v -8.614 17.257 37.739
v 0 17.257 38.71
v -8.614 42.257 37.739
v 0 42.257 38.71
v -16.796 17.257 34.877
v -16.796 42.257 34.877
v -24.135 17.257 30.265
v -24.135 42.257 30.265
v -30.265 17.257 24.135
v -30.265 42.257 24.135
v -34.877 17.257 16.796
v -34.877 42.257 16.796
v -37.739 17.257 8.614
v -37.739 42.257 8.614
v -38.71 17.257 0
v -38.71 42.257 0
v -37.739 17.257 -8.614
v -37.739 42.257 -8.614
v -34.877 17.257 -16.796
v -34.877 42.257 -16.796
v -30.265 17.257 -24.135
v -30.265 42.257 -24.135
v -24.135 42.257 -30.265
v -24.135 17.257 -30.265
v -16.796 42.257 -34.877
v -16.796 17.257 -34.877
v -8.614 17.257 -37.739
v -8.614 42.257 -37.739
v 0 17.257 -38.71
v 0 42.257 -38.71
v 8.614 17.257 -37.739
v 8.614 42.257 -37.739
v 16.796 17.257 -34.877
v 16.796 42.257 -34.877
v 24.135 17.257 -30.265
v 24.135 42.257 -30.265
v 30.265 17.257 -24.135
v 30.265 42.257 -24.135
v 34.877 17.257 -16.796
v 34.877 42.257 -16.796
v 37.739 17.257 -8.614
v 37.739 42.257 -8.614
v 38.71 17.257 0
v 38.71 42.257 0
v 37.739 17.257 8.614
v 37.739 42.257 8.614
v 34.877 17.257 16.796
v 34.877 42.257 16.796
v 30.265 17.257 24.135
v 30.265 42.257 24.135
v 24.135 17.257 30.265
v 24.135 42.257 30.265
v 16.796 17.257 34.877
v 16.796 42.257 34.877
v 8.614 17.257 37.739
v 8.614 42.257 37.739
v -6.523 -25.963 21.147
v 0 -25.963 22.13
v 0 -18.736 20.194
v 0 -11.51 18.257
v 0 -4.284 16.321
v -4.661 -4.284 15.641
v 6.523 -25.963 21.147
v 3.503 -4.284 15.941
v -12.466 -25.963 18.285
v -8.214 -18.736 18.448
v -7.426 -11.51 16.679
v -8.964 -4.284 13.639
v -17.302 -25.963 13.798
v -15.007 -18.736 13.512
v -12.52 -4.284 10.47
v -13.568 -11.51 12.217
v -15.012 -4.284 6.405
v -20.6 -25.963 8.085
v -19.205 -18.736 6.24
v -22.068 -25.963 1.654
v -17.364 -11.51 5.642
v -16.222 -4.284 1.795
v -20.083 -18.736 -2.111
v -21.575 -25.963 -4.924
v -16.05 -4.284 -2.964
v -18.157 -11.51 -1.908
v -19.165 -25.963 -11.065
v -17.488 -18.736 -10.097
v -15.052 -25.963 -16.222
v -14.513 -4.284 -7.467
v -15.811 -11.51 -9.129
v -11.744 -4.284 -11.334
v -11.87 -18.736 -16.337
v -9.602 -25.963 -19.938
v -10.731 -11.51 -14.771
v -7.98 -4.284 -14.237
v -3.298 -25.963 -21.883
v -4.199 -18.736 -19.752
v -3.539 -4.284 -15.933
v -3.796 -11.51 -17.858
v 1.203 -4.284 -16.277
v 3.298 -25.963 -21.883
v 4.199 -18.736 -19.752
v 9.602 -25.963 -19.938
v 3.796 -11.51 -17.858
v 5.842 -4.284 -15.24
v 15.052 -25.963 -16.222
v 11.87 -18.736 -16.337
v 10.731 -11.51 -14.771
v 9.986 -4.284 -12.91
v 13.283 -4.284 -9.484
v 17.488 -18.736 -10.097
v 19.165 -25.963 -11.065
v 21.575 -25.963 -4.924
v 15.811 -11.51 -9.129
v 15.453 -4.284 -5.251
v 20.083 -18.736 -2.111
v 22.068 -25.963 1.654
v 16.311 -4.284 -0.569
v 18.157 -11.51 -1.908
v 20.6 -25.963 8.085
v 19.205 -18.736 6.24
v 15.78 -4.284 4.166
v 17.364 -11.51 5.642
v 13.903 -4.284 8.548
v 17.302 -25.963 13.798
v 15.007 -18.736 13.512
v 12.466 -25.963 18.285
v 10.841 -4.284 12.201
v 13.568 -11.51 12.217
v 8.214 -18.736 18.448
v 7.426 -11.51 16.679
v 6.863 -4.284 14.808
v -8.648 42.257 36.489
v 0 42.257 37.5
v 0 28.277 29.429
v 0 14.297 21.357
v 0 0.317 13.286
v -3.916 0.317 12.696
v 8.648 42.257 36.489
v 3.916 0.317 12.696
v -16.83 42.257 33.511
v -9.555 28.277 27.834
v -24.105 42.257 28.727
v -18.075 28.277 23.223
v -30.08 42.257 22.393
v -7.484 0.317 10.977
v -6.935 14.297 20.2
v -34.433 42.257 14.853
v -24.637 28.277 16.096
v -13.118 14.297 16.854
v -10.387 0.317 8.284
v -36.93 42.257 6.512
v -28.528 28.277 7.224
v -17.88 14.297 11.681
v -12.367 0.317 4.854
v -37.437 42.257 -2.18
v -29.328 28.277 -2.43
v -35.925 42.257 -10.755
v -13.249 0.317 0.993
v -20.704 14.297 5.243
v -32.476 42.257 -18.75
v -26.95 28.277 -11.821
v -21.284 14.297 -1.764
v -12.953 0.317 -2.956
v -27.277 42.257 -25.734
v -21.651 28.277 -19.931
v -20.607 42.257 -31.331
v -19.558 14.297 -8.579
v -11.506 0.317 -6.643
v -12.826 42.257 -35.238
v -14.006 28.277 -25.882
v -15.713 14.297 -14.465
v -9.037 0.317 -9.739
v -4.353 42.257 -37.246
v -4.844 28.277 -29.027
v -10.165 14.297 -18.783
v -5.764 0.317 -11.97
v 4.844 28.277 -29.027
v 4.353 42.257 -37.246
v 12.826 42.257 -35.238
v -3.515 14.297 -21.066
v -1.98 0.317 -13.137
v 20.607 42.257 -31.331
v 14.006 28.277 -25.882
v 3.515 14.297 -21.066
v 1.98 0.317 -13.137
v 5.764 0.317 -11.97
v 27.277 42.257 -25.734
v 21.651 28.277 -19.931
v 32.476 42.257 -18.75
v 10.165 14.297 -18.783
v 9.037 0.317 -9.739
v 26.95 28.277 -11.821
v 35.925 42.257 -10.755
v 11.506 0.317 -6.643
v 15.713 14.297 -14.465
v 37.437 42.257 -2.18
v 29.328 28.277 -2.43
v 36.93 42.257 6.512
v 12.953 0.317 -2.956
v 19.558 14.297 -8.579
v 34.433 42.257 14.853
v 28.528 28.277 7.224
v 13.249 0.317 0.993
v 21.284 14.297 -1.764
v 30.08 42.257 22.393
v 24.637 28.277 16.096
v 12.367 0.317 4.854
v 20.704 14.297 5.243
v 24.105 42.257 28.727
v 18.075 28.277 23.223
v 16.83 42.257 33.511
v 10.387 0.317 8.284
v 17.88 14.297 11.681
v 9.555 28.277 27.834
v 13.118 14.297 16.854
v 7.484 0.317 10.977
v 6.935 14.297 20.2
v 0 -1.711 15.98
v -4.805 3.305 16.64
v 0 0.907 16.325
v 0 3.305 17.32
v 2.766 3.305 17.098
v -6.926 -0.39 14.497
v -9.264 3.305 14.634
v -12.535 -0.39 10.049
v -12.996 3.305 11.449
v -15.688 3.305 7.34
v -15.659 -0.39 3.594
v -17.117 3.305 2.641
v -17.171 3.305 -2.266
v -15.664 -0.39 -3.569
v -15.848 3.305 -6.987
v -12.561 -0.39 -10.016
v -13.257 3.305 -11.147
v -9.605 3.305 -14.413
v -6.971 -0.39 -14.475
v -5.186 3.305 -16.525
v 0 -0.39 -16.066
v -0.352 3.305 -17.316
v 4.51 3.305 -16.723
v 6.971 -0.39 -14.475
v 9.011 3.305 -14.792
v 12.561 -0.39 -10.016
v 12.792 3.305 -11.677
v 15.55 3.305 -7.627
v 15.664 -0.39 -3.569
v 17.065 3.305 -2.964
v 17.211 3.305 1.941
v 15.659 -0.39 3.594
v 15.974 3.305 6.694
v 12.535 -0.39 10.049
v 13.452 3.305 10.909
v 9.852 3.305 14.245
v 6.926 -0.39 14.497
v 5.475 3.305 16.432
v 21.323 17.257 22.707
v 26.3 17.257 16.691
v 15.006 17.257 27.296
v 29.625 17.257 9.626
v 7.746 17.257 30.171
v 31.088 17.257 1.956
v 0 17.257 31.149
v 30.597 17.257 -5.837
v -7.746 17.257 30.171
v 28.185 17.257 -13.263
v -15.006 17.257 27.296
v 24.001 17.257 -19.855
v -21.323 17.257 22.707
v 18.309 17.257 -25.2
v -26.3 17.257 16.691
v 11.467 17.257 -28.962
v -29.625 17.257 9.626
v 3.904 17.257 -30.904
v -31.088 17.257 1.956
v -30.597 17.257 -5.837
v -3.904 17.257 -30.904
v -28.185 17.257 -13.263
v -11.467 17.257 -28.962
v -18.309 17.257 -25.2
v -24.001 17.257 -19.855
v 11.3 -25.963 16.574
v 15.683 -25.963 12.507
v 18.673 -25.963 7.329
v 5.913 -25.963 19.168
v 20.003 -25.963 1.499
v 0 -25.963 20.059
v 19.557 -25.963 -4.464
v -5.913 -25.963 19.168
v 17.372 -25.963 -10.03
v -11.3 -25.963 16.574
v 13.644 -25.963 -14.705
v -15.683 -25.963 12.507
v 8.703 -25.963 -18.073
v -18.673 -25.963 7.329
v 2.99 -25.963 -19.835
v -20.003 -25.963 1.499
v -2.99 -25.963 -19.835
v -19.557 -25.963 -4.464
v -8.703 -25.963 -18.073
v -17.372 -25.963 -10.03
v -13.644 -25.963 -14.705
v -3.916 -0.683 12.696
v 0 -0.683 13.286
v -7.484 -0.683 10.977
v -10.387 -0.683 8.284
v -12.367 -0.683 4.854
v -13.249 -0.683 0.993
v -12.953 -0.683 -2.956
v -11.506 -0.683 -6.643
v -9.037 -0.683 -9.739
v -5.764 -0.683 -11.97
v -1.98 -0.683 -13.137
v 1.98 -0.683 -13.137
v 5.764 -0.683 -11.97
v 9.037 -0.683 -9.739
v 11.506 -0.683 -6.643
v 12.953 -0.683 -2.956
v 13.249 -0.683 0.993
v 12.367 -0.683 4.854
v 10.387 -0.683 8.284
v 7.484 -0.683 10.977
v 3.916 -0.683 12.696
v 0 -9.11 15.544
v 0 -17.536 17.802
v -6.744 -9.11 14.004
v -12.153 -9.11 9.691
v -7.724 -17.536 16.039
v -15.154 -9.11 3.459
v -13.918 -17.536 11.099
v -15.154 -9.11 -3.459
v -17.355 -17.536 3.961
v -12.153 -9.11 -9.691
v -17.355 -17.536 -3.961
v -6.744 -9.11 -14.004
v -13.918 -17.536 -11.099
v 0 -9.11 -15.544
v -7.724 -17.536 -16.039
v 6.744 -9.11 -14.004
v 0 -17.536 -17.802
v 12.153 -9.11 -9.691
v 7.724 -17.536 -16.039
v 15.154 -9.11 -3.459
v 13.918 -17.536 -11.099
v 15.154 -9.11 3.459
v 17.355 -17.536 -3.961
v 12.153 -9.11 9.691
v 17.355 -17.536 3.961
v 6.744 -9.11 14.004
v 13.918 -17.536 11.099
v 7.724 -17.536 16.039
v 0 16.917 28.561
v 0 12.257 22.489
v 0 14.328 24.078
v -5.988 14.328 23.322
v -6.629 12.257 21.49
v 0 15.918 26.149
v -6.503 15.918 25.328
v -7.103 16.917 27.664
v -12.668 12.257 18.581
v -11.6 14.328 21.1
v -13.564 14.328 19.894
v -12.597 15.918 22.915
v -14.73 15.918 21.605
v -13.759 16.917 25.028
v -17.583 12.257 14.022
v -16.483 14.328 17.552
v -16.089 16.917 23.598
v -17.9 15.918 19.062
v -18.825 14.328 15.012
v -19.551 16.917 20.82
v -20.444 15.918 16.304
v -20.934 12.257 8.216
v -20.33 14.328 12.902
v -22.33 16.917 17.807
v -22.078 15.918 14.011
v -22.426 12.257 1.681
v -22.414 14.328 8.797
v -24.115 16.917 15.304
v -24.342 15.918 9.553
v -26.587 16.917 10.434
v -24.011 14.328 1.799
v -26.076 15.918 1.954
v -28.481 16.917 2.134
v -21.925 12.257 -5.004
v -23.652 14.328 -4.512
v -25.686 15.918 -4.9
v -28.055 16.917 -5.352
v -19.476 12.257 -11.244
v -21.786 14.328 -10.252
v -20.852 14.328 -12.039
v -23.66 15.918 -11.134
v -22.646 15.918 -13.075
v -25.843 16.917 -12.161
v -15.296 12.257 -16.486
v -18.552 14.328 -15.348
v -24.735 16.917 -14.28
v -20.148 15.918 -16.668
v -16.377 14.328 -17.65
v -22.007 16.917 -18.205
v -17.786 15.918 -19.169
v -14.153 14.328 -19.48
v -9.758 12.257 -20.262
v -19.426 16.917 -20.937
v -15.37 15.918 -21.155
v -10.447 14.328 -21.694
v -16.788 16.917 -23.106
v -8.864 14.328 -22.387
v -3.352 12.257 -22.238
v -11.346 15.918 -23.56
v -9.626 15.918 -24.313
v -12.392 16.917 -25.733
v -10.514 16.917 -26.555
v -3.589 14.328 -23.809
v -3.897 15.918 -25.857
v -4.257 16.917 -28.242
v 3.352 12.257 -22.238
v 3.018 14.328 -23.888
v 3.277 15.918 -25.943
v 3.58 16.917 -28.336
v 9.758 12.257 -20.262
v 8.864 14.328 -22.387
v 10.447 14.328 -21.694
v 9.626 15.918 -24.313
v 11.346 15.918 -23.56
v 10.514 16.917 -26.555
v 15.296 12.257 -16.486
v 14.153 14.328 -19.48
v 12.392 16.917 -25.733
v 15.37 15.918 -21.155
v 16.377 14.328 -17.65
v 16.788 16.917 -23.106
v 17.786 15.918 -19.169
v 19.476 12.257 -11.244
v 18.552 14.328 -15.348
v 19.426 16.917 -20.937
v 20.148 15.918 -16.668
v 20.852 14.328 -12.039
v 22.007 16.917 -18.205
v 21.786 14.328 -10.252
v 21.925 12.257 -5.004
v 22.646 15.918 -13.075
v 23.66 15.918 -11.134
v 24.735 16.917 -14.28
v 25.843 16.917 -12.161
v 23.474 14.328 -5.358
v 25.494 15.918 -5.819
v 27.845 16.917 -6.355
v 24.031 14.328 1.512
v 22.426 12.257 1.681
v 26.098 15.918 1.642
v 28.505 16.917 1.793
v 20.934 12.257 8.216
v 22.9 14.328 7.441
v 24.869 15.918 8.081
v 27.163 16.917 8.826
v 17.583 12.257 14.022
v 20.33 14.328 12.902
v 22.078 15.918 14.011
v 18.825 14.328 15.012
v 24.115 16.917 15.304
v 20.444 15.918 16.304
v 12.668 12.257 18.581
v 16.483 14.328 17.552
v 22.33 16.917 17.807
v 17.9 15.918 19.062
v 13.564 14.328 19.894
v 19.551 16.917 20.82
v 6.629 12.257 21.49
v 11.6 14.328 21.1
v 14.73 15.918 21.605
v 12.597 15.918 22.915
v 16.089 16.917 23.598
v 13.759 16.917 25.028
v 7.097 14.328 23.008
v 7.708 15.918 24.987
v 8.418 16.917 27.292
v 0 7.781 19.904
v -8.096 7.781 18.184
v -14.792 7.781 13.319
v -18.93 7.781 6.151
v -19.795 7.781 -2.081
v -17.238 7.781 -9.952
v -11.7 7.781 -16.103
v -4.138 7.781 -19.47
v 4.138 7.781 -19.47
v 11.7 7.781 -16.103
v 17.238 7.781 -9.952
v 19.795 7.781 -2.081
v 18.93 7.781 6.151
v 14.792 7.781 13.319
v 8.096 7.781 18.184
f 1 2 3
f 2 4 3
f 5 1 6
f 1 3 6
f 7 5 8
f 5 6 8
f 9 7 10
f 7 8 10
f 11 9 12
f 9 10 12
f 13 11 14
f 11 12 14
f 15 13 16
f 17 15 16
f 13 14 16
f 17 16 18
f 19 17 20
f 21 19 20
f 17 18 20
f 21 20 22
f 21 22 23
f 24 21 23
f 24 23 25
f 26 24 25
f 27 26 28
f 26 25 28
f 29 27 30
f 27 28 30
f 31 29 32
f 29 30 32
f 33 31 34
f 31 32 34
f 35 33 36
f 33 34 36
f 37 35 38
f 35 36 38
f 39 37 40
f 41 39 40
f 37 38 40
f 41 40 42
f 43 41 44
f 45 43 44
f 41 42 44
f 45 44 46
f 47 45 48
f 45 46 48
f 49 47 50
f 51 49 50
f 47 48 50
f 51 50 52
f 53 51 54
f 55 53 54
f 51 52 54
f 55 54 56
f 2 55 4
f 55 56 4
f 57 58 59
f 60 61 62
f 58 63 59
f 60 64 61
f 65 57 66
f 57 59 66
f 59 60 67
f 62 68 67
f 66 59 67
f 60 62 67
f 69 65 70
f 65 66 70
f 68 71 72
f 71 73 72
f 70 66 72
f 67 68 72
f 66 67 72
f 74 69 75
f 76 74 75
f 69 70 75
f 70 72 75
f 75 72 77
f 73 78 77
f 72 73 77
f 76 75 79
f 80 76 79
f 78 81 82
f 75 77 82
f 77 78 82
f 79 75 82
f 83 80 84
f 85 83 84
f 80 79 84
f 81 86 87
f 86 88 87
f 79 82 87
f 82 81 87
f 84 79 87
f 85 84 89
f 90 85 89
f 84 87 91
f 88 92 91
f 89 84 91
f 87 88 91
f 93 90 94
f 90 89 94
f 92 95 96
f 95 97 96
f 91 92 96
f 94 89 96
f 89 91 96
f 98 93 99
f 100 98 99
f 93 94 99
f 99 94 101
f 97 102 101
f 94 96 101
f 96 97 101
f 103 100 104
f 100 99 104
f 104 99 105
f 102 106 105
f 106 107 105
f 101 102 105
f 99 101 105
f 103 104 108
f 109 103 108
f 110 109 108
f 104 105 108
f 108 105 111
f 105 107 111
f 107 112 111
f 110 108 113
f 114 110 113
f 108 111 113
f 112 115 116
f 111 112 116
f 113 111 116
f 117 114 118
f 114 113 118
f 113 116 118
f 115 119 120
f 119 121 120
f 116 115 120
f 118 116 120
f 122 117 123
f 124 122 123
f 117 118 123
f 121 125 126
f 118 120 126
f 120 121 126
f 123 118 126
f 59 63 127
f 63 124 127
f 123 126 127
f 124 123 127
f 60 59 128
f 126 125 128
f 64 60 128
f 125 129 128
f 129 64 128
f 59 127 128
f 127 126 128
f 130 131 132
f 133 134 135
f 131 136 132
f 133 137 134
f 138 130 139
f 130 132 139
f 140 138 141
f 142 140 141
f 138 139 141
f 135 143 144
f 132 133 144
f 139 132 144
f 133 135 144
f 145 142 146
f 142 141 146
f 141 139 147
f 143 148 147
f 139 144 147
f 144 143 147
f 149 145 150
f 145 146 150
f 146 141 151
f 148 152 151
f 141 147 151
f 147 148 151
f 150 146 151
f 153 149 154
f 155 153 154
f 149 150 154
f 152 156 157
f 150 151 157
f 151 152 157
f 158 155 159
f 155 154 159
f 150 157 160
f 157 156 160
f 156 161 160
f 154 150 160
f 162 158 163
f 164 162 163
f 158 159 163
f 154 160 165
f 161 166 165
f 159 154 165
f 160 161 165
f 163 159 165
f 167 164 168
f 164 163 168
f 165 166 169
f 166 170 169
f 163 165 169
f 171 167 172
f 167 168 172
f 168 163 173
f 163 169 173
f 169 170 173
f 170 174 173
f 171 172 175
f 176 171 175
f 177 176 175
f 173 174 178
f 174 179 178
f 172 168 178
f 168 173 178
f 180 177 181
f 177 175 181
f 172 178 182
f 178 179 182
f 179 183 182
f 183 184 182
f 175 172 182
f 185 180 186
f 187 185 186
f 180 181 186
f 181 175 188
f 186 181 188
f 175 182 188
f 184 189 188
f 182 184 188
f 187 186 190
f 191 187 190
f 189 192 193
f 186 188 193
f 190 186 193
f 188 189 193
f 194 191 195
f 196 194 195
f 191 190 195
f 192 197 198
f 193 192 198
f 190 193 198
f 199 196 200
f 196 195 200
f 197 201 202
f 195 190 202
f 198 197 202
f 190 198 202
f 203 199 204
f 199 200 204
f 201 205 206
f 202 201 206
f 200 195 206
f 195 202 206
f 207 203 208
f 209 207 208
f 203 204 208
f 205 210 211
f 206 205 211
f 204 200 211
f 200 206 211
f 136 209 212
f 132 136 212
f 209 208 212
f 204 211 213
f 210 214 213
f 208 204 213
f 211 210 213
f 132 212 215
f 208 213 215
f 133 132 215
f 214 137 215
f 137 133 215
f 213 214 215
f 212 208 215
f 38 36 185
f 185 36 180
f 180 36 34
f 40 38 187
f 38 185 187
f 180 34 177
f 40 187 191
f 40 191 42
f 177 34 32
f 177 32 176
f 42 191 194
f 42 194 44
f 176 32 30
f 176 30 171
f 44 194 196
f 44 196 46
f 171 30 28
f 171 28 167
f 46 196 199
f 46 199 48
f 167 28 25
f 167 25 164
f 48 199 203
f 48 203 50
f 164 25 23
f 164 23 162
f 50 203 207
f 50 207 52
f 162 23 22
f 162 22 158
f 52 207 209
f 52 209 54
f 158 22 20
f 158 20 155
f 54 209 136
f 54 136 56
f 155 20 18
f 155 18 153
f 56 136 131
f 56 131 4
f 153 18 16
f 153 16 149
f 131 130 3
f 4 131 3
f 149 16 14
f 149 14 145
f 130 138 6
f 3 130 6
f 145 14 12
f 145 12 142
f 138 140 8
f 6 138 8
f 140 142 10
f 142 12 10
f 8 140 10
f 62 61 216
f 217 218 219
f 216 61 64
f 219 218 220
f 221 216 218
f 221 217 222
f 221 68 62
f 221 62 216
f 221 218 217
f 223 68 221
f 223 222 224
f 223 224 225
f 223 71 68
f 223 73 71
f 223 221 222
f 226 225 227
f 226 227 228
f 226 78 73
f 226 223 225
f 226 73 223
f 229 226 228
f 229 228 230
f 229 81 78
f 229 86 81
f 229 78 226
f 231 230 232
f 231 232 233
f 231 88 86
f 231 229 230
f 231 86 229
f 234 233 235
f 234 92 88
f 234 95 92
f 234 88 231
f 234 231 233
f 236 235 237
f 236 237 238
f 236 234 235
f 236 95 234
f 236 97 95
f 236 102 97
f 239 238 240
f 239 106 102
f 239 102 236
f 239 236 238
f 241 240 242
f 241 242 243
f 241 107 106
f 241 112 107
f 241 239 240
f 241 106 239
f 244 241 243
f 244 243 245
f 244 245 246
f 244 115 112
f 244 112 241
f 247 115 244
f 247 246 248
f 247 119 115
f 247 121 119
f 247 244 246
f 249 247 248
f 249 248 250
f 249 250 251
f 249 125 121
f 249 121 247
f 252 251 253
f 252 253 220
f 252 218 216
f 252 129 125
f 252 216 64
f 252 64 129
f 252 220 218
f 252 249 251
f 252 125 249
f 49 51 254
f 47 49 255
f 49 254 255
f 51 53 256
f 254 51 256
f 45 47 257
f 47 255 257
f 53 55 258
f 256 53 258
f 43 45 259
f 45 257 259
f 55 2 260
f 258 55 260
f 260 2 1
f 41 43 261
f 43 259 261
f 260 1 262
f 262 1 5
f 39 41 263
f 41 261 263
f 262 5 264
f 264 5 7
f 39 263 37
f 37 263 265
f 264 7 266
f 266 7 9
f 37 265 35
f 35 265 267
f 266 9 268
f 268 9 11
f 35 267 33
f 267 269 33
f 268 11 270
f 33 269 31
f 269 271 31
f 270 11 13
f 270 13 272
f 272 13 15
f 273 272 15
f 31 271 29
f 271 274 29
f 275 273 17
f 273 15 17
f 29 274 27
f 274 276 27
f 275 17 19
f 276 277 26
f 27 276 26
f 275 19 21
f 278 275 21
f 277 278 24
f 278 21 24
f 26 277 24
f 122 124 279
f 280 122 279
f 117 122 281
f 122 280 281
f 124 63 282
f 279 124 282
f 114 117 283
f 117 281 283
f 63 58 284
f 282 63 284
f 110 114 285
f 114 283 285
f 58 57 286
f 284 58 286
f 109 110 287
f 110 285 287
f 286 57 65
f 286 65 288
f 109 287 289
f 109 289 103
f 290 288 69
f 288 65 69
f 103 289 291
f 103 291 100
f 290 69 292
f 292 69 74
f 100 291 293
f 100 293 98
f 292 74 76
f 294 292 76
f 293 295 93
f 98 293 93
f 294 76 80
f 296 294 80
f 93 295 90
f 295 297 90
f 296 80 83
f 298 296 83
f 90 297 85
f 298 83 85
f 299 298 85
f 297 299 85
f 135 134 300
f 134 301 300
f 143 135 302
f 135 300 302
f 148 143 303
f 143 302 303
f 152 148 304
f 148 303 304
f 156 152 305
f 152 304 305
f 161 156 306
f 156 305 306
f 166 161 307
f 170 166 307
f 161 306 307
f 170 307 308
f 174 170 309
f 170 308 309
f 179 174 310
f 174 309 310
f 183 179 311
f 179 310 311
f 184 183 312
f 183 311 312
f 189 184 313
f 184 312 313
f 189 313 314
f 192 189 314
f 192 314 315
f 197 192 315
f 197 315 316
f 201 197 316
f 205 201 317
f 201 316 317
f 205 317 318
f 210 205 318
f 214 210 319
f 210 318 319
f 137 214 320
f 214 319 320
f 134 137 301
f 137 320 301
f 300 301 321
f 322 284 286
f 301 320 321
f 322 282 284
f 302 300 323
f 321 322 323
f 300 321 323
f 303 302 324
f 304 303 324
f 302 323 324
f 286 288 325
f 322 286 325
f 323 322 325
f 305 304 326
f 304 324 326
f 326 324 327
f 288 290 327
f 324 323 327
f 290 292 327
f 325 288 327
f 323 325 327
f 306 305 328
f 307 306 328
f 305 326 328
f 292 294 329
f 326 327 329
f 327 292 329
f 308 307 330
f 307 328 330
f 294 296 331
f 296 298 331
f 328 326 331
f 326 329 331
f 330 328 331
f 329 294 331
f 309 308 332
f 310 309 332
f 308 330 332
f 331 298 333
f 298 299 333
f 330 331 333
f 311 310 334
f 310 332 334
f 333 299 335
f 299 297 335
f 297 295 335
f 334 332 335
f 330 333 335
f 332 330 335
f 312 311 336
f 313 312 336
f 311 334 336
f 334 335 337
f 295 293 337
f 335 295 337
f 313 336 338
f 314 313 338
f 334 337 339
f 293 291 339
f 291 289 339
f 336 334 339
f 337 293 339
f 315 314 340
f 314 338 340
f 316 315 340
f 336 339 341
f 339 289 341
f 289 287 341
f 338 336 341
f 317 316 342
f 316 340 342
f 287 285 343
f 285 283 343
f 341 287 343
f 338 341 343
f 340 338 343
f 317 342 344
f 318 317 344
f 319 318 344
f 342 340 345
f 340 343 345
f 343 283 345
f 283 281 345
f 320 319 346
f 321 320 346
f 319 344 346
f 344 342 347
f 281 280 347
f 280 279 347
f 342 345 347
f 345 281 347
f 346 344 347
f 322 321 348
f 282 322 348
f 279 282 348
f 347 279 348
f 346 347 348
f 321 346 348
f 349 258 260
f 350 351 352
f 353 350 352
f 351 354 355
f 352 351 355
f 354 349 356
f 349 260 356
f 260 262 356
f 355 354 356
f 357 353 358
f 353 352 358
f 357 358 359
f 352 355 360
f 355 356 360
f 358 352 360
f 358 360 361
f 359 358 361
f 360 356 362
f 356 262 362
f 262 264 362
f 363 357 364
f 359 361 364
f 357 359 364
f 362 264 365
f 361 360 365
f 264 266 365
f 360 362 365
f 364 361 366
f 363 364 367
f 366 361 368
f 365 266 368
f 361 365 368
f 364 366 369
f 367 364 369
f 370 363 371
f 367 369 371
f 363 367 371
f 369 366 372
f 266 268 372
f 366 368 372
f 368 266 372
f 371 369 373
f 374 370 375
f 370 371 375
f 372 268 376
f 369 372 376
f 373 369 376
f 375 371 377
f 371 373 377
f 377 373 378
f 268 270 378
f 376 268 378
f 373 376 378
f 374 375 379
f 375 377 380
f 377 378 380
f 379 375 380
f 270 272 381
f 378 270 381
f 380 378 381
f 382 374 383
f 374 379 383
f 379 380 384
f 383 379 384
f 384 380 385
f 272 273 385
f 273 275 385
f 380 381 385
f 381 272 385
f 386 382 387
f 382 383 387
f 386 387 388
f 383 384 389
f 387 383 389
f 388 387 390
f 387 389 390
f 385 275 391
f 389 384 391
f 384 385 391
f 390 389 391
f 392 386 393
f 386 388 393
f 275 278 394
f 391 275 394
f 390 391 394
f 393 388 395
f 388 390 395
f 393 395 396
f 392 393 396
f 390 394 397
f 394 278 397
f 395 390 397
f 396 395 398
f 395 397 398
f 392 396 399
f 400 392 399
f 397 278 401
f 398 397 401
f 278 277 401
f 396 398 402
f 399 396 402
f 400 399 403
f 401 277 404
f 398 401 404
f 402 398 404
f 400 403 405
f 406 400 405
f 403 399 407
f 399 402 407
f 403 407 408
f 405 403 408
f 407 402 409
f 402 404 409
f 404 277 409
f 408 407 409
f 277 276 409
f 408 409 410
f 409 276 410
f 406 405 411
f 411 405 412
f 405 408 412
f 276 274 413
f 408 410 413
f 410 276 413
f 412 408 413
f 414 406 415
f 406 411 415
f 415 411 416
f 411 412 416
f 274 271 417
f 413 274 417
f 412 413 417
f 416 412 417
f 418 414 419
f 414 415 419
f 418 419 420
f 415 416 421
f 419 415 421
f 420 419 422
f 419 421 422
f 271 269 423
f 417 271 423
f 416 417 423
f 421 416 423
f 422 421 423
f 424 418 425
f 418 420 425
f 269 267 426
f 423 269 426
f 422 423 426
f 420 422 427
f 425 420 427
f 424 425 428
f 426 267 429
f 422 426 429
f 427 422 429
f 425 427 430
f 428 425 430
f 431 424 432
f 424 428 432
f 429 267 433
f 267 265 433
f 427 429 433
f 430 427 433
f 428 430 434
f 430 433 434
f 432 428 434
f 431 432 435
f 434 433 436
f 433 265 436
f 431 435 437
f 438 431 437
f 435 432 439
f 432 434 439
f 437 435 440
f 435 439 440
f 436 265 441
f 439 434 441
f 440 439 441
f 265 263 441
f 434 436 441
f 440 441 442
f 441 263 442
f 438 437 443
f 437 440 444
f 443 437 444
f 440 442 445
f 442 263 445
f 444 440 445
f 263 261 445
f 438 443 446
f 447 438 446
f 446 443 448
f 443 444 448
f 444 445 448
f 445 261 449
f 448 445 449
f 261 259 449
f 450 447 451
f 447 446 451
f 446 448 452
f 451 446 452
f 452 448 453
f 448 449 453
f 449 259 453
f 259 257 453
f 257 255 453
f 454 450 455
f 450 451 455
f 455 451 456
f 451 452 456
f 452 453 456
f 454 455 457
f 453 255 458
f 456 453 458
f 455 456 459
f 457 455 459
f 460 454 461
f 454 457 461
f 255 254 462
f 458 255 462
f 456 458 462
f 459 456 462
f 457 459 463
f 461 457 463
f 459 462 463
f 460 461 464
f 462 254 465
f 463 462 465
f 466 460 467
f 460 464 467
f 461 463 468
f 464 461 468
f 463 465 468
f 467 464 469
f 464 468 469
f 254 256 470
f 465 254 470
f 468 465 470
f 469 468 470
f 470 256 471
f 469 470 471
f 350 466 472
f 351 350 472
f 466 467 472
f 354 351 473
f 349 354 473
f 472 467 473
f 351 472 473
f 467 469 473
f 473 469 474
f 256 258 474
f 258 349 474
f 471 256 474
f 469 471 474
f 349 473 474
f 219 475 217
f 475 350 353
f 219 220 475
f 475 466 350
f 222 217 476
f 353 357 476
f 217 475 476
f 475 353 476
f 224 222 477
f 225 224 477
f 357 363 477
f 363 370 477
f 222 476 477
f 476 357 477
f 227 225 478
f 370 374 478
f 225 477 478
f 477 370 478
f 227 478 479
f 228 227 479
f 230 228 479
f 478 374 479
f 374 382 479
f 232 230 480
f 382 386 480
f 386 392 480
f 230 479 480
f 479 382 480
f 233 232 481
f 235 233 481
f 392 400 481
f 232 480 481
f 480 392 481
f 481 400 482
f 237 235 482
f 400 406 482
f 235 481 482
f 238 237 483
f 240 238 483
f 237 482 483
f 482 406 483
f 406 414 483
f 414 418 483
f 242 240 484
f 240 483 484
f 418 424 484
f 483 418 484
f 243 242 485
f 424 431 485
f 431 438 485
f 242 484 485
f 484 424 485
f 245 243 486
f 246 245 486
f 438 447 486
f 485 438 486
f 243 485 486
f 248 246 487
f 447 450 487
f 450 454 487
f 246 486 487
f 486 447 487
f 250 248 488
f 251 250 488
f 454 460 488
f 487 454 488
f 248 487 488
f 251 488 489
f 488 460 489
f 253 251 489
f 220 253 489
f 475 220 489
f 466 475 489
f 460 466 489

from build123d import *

# Parameters (mm, degrees)
FILLET1_R = 10


with BuildPart() as part:
    # Sketch1 → Revolve1 (revolve)
    with BuildSketch(Plane.XY, mode=Mode.PRIVATE) as revolve1_sk:
        Polygon((37.5, 42.257268448), (13.285767388, 0.316987298), (13.285767388, -0.683012702), (20.059447639, -25.962731552), (22.13, -25.962731552), (15.249019056, -0.282561065), (25.375644347, 17.257268448), (38.71, 17.257268448), (38.71, 42.257268448), align=None)
    revolve(revolve1_sk.sketch.rotate(Axis((0, 0, 0), (0, -1, 0)), 90), axis=Axis((0, 0, 0), (0, -1, 0)))

    # Fillet1
    fillet1_edges = [part.edges().sort_by_distance(p)[0] for p in [
        (0, 17.257268448, -25.375644347),
        (0, -0.282561065, -15.249019056),
    ]]
    fillet(fillet1_edges, radius=FILLET1_R)


solid = part.part
